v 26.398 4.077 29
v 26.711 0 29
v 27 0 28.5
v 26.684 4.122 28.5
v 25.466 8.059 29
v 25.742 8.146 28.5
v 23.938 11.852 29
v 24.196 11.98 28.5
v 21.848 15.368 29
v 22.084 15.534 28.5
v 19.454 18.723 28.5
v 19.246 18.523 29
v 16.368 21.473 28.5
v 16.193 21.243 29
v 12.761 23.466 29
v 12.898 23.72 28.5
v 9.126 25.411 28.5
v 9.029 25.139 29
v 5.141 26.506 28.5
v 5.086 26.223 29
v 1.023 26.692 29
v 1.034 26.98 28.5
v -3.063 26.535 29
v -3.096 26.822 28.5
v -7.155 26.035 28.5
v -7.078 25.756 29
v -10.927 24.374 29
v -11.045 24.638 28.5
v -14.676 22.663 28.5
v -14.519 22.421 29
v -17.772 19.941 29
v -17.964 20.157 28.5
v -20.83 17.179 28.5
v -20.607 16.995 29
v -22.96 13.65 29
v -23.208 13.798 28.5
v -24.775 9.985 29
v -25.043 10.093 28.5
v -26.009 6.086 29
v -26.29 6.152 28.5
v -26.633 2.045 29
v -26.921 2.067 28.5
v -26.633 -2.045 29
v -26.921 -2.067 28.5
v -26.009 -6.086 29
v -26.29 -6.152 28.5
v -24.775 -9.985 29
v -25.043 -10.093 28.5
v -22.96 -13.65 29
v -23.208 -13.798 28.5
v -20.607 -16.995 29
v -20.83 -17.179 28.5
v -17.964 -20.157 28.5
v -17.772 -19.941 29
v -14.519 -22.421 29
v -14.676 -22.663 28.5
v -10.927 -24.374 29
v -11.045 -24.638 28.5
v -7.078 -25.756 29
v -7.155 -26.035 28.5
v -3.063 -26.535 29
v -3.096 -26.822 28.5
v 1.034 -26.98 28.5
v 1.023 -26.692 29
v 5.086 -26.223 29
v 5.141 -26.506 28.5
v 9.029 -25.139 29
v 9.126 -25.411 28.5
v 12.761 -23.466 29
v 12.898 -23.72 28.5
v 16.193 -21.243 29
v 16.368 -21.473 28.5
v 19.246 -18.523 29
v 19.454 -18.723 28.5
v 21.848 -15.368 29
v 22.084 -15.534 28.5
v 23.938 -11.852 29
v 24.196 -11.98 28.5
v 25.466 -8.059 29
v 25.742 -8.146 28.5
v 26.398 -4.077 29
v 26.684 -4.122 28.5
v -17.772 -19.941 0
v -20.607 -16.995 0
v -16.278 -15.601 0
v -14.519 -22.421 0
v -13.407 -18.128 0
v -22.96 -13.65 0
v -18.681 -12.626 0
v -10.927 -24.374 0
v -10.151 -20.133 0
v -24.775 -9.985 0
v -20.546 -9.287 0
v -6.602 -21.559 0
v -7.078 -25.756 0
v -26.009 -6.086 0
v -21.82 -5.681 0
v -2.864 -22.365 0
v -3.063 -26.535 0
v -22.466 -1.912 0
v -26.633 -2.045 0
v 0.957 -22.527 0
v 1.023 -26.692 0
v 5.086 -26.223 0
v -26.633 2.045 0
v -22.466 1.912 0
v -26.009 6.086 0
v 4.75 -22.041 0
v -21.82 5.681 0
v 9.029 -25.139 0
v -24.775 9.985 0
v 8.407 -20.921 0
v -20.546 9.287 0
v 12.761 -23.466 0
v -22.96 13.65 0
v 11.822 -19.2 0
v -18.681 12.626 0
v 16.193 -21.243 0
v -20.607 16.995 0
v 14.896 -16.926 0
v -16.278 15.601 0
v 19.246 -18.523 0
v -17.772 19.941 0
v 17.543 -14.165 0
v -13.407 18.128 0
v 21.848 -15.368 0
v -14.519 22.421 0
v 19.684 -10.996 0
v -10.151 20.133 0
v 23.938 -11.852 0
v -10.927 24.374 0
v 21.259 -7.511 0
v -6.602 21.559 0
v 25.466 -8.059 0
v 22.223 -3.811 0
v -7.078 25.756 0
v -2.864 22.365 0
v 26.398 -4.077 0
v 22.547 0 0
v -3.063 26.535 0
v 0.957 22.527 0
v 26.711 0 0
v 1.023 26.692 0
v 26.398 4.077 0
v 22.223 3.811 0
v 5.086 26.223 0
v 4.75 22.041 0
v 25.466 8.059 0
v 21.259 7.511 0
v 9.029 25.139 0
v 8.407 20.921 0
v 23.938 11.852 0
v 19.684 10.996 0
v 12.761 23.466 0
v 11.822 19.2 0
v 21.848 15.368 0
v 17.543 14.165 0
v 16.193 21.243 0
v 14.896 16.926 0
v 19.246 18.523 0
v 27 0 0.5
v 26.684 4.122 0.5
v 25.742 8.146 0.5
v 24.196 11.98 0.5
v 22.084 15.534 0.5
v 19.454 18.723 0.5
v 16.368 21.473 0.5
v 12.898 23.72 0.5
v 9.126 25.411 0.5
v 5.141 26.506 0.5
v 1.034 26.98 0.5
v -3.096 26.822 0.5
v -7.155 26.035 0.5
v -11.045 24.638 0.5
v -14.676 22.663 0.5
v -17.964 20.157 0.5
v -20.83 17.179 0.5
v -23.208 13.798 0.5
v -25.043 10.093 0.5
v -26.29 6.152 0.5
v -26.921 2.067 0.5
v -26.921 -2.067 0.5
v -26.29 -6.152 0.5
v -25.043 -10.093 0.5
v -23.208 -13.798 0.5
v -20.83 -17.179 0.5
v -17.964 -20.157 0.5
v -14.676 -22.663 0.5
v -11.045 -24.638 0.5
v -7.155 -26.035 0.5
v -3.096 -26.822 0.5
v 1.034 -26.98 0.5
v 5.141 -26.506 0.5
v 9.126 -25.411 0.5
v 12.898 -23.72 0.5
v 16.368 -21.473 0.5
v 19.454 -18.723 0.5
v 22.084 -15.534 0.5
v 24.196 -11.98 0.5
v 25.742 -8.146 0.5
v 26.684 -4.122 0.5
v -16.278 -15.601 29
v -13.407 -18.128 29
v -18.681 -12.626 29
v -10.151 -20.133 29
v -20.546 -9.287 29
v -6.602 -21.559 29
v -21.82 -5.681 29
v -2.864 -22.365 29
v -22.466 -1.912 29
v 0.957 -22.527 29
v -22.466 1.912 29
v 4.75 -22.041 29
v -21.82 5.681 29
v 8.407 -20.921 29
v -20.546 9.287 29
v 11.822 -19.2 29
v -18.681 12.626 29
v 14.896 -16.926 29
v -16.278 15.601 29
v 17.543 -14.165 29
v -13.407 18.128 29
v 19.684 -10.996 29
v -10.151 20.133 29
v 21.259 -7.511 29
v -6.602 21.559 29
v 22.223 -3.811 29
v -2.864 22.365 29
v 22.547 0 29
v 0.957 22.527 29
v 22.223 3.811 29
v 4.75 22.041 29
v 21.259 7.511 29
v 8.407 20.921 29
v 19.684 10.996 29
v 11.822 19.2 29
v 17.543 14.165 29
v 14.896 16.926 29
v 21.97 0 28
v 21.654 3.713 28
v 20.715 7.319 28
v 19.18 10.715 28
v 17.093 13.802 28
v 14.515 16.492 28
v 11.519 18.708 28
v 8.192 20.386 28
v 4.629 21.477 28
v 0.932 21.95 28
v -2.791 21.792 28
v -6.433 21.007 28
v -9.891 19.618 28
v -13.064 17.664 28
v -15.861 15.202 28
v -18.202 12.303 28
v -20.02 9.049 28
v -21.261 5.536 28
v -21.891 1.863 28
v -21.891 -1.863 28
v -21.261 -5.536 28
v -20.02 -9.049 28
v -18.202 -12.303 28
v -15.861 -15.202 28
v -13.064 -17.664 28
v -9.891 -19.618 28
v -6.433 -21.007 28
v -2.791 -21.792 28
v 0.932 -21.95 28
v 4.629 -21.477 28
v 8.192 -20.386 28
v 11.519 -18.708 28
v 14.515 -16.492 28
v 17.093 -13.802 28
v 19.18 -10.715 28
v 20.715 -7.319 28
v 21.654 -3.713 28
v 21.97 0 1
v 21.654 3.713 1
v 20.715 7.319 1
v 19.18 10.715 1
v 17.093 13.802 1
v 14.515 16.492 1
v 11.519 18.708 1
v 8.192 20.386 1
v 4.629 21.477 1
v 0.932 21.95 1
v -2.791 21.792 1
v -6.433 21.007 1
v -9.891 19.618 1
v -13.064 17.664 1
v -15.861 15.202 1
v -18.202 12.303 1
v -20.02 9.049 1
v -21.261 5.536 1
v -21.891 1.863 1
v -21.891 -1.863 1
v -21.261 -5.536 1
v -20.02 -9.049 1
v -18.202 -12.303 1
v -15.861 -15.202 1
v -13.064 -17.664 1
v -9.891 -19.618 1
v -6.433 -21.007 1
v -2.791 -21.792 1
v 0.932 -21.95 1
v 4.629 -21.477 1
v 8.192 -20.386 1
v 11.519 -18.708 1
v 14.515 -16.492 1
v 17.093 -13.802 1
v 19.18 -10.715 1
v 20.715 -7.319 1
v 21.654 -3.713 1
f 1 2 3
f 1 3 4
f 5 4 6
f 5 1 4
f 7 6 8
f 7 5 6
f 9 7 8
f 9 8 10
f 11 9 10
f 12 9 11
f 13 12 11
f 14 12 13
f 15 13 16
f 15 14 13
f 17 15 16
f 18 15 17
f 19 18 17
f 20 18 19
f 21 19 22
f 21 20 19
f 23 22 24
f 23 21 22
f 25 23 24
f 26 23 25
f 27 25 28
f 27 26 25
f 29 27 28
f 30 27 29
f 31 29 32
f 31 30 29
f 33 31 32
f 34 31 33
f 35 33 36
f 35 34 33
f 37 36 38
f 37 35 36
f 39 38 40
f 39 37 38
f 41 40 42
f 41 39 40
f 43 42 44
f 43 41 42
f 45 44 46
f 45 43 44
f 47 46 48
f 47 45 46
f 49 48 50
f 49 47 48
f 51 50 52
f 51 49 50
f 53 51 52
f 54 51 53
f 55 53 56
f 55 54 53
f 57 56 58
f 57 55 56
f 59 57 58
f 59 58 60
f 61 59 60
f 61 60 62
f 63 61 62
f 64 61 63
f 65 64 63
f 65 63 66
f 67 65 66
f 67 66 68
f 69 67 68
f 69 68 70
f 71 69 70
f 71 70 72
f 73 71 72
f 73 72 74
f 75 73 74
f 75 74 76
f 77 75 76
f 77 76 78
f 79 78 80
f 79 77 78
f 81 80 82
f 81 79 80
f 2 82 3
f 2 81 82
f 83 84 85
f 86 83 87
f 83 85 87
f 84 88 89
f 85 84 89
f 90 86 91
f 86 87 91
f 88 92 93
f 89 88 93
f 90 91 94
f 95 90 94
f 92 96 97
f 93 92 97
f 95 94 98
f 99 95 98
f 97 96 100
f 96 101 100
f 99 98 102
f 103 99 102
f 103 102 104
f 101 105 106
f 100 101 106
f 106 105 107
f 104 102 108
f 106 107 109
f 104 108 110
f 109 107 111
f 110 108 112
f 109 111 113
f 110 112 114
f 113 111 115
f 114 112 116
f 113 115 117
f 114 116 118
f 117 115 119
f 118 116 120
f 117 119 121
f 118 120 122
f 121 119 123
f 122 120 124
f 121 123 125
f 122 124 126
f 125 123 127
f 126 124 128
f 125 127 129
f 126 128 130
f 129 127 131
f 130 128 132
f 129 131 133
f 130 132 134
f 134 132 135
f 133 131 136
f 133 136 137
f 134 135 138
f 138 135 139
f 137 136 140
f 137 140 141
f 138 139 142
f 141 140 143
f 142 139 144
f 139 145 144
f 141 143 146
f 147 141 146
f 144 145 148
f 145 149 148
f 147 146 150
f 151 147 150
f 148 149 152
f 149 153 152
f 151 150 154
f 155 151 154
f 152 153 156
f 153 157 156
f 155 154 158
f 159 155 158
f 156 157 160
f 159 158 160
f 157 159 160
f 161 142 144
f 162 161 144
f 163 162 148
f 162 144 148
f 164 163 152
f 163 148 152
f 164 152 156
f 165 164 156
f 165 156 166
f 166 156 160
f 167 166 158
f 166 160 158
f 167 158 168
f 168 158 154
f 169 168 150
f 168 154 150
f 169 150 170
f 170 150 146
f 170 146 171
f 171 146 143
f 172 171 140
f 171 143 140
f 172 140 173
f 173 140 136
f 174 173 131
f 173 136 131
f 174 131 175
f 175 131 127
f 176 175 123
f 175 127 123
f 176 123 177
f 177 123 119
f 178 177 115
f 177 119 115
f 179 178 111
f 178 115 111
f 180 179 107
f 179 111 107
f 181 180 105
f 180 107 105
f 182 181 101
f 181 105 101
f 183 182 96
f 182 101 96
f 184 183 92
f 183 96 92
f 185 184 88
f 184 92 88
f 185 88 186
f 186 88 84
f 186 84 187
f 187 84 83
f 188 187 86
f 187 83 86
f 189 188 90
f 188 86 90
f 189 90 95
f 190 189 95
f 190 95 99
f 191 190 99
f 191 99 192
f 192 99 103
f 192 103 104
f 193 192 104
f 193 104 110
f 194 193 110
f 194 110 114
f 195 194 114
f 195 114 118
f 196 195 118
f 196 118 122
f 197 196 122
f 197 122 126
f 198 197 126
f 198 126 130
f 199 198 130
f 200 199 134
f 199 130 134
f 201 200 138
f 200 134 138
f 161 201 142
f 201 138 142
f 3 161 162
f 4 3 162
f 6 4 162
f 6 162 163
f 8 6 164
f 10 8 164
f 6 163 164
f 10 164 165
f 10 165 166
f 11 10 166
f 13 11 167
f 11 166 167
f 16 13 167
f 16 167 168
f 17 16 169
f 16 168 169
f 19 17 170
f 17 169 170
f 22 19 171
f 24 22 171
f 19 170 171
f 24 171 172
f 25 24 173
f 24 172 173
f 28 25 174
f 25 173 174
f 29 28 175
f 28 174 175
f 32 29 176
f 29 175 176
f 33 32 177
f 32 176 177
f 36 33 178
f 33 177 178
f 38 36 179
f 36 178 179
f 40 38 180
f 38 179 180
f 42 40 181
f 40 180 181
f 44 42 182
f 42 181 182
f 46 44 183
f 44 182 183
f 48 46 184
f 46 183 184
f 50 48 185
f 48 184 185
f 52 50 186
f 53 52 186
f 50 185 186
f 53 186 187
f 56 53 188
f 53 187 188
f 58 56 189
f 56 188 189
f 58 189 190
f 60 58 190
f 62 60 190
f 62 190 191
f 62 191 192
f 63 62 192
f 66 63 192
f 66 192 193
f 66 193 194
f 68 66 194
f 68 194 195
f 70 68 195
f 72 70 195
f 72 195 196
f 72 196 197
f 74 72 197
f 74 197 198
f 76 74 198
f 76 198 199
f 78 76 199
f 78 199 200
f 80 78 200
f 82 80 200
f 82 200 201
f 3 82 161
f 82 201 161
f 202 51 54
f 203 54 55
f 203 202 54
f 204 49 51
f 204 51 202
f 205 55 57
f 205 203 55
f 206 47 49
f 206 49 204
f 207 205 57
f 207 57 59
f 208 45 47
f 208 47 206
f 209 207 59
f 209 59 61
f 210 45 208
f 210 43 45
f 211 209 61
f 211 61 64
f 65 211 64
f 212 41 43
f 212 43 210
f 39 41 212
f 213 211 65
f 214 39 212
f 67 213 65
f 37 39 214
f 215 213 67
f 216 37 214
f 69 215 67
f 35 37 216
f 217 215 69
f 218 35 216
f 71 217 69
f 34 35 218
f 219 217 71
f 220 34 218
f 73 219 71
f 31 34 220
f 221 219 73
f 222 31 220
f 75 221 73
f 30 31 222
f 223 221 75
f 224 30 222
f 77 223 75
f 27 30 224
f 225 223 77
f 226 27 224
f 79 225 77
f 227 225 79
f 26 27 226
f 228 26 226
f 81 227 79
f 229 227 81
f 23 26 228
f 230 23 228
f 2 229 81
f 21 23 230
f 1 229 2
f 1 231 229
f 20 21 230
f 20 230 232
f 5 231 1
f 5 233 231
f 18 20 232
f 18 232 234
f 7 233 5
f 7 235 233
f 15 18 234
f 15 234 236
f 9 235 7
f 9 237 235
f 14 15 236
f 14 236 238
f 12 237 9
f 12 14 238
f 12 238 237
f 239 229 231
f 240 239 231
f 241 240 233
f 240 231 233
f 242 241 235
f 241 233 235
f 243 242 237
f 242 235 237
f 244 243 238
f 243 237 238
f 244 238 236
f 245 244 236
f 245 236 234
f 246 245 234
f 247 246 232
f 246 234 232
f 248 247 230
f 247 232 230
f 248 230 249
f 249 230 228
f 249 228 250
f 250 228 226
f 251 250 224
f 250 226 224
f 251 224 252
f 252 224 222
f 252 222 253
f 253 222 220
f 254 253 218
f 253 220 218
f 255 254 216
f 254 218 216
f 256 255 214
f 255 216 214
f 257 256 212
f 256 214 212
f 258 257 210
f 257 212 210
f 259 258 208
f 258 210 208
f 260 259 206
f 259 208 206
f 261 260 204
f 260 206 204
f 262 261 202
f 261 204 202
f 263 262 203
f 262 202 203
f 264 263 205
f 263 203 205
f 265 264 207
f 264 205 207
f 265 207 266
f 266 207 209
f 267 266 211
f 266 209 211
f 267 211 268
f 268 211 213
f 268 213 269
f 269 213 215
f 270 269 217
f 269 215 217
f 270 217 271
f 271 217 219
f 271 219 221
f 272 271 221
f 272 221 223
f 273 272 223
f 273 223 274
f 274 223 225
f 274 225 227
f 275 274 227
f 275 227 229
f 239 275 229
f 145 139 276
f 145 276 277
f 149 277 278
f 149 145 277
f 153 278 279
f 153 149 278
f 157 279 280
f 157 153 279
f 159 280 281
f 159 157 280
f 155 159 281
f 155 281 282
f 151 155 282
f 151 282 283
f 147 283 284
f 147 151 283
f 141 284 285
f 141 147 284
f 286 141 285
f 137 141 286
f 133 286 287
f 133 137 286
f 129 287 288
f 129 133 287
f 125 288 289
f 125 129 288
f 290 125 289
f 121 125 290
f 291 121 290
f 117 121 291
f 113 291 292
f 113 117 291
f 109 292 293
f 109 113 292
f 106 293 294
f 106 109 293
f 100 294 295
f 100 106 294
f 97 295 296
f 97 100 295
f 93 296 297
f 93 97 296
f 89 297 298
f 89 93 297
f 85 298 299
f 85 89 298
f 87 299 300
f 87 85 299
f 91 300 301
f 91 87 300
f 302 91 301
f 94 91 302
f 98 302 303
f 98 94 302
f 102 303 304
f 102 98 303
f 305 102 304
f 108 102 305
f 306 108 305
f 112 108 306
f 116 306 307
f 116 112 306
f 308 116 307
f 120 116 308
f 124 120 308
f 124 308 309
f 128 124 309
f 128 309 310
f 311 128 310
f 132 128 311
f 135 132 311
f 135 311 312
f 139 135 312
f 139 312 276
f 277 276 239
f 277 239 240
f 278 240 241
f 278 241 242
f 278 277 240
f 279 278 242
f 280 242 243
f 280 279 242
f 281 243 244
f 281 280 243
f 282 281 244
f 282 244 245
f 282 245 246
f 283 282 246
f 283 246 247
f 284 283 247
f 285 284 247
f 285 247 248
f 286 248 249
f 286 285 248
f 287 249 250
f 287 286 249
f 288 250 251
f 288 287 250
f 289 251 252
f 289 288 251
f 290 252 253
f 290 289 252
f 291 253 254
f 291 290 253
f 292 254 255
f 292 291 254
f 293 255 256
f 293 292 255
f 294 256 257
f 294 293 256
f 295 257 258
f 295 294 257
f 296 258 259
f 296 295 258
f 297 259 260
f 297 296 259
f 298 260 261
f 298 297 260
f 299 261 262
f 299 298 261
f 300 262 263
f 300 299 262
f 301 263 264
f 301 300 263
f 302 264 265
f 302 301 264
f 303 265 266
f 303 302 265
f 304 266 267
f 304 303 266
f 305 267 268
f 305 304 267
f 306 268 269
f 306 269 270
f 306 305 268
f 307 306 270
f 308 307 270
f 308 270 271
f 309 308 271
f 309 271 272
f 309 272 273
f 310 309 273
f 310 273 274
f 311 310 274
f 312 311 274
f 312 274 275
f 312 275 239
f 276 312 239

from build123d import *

# Parameters (mm, degrees)
F0_R     = 27
F0_R_2   = 21.97
F1_DEPTH = 29
F2_SIZE2 = 0.5773502692
F2_SIZE  = 1
F3_SIZE2 = 0.2886751346
F3_SIZE  = 0.5


with BuildPart() as f1:
    # F0 (on Top) → F1 (new body)
    with BuildSketch(Plane.XY):
        Circle(F0_R)
        Circle(F0_R_2, mode=Mode.SUBTRACT)
    extrude(amount=F1_DEPTH)

    # F2
    f2_edges = [f1.edges().sort_by_distance(p)[0] for p in [
        (-21.97, 0, 29),
        (-21.97, 0, 0),
    ]]
    f2_side = f1.faces().sort_by_distance((-21.97, 0, 14.5))[0]
    chamfer(f2_edges, length=F2_SIZE, length2=F2_SIZE2, reference=f2_side)

    # F3
    f3_edges = [f1.edges().sort_by_distance(p)[0] for p in [
        (-27, 0, 29),
        (-27, 0, 0),
    ]]
    f3_side = f1.faces().sort_by_distance((-27, 0, 14.5))[0]
    chamfer(f3_edges, length=F3_SIZE, length2=F3_SIZE2, reference=f3_side)


solid = f1.part
